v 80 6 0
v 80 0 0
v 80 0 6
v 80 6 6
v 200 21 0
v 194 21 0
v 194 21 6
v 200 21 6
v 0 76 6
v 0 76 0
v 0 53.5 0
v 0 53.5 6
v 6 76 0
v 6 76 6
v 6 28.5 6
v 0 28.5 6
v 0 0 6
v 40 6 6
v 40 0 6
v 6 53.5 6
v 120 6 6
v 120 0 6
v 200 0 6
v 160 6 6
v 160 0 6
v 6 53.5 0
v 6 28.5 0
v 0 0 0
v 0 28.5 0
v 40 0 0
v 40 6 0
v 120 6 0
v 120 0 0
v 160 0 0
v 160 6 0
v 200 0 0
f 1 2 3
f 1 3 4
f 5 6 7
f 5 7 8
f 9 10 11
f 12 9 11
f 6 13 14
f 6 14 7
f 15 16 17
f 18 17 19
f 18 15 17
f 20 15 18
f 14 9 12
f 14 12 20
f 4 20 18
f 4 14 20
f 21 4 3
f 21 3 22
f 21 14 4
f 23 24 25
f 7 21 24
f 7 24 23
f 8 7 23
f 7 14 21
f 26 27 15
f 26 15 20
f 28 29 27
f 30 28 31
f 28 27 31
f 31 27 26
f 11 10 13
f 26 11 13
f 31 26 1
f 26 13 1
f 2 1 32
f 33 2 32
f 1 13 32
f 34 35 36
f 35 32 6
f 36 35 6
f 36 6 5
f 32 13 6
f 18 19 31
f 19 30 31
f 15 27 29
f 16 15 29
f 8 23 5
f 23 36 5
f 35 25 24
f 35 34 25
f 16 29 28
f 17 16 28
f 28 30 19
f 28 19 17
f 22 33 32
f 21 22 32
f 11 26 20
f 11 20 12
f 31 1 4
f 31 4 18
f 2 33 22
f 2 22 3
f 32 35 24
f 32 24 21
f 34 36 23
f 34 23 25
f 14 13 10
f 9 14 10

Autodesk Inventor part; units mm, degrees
ref_plane "YZ Plane" through (0, 0, 0) normal (1, 0, 0) x (0, 1, 0)
ref_plane "XZ Plane" through (0, 0, 0) normal (0, 1, 0) x (-1, 0, 0)
ref_plane "XY Plane" through (0, 0, 0) normal (0, 0, 1) x (1, 0, 0)
ref_plane "Work Plane1" through (0, 0, 0) normal (0, 0, 1) x (1, 0, 0)
sketch "Sketch1" plane through (0, 0, 0) normal (0, 0, 1) x (1, 0, 0)
  line L0 (0, 6) -> (40, 6)
  line L1 (0, 0) -> (0, 6)
  line L2 (40, 0) -> (0, 0)
  line L3 (40, 0) -> (40, 6)
  line L4 (80, 0) -> (80, 6)
  line L5 (80, 6) -> (40, 6)
  line L6 (40, 6) -> (40, 0)
  line L7 (40, 0) -> (80, 0)
  line L8 (80, 6) -> (120, 6)
  line L9 (80, 0) -> (80, 6)
  line L10 (120, 0) -> (80, 0)
  line L11 (120, 0) -> (120, 6)
  line L12 (160, 0) -> (160, 6)
  line L13 (160, 6) -> (120, 6)
  line L14 (120, 6) -> (120, 0)
  line L15 (120, 0) -> (160, 0)
  line L16 (160, 6) -> (200, 6)
  line L17 (160, 0) -> (160, 6)
  line L18 (200, 0) -> (160, 0)
  line L19 (200, 6) -> (200, 0)
  line L20 (200, 6) -> (200, 21)
  line L21 (194, 21) -> (200, 21)
  line L22 (194, 21) -> (194, 6)
  line L23 (194, 6) -> (200, 6)
  line L24 (6, 28.5) -> (0, 28.5)
  line L25 (0, 28.5) -> (0, 6)
  line L26 (6, 6) -> (0, 6)
  line L27 (6, 6) -> (6, 28.5)
  line L28 (0, 53.5) -> (0, 28.5)
  line L29 (6, 28.5) -> (0, 28.5)
  line L30 (6, 28.5) -> (6, 53.5)
  line L31 (6, 53.5) -> (0, 53.5)
  line L32 (6, 53.5) -> (0, 53.5)
  line L33 (6, 53.5) -> (6, 76)
  line L34 (6, 76) -> (0, 76)
  line L35 (0, 76) -> (0, 53.5)
  line L36 (6, 76) -> (194, 21)
extrude "Plate1" add sketch "Sketch1" along normal blind 6 contours L25 L24 L27 L0 | L0 L3 L2 L1 | L27 L30 L33 L36 L22 L16 L13 L8 L5 L0 | L35 L34 L33 L31 | L8 L11 L10 L4 | L16 L19 L18 L12 | L21 L20 L16 L22
equation "\"d0\" = Thickness"
equation "\"BendRadius\" = Thickness"
equation "\"BendReliefWidth\" = Thickness"
equation "\"BendReliefDepth\" = 0.5 * Thickness"
equation "\"CornerReliefSize\" = 4 * Thickness"
equation "\"MinimumRemnant\" = 2 * Thickness"
equation "\"TransitionRadius\" = BendRadius"
equation "\"JacobiRadiusSize\" = BendRadius"
equation "\"GapSize\" = Thickness"
equation "\"Thickness\" = 6"
properties material "Wood (Birch)"
